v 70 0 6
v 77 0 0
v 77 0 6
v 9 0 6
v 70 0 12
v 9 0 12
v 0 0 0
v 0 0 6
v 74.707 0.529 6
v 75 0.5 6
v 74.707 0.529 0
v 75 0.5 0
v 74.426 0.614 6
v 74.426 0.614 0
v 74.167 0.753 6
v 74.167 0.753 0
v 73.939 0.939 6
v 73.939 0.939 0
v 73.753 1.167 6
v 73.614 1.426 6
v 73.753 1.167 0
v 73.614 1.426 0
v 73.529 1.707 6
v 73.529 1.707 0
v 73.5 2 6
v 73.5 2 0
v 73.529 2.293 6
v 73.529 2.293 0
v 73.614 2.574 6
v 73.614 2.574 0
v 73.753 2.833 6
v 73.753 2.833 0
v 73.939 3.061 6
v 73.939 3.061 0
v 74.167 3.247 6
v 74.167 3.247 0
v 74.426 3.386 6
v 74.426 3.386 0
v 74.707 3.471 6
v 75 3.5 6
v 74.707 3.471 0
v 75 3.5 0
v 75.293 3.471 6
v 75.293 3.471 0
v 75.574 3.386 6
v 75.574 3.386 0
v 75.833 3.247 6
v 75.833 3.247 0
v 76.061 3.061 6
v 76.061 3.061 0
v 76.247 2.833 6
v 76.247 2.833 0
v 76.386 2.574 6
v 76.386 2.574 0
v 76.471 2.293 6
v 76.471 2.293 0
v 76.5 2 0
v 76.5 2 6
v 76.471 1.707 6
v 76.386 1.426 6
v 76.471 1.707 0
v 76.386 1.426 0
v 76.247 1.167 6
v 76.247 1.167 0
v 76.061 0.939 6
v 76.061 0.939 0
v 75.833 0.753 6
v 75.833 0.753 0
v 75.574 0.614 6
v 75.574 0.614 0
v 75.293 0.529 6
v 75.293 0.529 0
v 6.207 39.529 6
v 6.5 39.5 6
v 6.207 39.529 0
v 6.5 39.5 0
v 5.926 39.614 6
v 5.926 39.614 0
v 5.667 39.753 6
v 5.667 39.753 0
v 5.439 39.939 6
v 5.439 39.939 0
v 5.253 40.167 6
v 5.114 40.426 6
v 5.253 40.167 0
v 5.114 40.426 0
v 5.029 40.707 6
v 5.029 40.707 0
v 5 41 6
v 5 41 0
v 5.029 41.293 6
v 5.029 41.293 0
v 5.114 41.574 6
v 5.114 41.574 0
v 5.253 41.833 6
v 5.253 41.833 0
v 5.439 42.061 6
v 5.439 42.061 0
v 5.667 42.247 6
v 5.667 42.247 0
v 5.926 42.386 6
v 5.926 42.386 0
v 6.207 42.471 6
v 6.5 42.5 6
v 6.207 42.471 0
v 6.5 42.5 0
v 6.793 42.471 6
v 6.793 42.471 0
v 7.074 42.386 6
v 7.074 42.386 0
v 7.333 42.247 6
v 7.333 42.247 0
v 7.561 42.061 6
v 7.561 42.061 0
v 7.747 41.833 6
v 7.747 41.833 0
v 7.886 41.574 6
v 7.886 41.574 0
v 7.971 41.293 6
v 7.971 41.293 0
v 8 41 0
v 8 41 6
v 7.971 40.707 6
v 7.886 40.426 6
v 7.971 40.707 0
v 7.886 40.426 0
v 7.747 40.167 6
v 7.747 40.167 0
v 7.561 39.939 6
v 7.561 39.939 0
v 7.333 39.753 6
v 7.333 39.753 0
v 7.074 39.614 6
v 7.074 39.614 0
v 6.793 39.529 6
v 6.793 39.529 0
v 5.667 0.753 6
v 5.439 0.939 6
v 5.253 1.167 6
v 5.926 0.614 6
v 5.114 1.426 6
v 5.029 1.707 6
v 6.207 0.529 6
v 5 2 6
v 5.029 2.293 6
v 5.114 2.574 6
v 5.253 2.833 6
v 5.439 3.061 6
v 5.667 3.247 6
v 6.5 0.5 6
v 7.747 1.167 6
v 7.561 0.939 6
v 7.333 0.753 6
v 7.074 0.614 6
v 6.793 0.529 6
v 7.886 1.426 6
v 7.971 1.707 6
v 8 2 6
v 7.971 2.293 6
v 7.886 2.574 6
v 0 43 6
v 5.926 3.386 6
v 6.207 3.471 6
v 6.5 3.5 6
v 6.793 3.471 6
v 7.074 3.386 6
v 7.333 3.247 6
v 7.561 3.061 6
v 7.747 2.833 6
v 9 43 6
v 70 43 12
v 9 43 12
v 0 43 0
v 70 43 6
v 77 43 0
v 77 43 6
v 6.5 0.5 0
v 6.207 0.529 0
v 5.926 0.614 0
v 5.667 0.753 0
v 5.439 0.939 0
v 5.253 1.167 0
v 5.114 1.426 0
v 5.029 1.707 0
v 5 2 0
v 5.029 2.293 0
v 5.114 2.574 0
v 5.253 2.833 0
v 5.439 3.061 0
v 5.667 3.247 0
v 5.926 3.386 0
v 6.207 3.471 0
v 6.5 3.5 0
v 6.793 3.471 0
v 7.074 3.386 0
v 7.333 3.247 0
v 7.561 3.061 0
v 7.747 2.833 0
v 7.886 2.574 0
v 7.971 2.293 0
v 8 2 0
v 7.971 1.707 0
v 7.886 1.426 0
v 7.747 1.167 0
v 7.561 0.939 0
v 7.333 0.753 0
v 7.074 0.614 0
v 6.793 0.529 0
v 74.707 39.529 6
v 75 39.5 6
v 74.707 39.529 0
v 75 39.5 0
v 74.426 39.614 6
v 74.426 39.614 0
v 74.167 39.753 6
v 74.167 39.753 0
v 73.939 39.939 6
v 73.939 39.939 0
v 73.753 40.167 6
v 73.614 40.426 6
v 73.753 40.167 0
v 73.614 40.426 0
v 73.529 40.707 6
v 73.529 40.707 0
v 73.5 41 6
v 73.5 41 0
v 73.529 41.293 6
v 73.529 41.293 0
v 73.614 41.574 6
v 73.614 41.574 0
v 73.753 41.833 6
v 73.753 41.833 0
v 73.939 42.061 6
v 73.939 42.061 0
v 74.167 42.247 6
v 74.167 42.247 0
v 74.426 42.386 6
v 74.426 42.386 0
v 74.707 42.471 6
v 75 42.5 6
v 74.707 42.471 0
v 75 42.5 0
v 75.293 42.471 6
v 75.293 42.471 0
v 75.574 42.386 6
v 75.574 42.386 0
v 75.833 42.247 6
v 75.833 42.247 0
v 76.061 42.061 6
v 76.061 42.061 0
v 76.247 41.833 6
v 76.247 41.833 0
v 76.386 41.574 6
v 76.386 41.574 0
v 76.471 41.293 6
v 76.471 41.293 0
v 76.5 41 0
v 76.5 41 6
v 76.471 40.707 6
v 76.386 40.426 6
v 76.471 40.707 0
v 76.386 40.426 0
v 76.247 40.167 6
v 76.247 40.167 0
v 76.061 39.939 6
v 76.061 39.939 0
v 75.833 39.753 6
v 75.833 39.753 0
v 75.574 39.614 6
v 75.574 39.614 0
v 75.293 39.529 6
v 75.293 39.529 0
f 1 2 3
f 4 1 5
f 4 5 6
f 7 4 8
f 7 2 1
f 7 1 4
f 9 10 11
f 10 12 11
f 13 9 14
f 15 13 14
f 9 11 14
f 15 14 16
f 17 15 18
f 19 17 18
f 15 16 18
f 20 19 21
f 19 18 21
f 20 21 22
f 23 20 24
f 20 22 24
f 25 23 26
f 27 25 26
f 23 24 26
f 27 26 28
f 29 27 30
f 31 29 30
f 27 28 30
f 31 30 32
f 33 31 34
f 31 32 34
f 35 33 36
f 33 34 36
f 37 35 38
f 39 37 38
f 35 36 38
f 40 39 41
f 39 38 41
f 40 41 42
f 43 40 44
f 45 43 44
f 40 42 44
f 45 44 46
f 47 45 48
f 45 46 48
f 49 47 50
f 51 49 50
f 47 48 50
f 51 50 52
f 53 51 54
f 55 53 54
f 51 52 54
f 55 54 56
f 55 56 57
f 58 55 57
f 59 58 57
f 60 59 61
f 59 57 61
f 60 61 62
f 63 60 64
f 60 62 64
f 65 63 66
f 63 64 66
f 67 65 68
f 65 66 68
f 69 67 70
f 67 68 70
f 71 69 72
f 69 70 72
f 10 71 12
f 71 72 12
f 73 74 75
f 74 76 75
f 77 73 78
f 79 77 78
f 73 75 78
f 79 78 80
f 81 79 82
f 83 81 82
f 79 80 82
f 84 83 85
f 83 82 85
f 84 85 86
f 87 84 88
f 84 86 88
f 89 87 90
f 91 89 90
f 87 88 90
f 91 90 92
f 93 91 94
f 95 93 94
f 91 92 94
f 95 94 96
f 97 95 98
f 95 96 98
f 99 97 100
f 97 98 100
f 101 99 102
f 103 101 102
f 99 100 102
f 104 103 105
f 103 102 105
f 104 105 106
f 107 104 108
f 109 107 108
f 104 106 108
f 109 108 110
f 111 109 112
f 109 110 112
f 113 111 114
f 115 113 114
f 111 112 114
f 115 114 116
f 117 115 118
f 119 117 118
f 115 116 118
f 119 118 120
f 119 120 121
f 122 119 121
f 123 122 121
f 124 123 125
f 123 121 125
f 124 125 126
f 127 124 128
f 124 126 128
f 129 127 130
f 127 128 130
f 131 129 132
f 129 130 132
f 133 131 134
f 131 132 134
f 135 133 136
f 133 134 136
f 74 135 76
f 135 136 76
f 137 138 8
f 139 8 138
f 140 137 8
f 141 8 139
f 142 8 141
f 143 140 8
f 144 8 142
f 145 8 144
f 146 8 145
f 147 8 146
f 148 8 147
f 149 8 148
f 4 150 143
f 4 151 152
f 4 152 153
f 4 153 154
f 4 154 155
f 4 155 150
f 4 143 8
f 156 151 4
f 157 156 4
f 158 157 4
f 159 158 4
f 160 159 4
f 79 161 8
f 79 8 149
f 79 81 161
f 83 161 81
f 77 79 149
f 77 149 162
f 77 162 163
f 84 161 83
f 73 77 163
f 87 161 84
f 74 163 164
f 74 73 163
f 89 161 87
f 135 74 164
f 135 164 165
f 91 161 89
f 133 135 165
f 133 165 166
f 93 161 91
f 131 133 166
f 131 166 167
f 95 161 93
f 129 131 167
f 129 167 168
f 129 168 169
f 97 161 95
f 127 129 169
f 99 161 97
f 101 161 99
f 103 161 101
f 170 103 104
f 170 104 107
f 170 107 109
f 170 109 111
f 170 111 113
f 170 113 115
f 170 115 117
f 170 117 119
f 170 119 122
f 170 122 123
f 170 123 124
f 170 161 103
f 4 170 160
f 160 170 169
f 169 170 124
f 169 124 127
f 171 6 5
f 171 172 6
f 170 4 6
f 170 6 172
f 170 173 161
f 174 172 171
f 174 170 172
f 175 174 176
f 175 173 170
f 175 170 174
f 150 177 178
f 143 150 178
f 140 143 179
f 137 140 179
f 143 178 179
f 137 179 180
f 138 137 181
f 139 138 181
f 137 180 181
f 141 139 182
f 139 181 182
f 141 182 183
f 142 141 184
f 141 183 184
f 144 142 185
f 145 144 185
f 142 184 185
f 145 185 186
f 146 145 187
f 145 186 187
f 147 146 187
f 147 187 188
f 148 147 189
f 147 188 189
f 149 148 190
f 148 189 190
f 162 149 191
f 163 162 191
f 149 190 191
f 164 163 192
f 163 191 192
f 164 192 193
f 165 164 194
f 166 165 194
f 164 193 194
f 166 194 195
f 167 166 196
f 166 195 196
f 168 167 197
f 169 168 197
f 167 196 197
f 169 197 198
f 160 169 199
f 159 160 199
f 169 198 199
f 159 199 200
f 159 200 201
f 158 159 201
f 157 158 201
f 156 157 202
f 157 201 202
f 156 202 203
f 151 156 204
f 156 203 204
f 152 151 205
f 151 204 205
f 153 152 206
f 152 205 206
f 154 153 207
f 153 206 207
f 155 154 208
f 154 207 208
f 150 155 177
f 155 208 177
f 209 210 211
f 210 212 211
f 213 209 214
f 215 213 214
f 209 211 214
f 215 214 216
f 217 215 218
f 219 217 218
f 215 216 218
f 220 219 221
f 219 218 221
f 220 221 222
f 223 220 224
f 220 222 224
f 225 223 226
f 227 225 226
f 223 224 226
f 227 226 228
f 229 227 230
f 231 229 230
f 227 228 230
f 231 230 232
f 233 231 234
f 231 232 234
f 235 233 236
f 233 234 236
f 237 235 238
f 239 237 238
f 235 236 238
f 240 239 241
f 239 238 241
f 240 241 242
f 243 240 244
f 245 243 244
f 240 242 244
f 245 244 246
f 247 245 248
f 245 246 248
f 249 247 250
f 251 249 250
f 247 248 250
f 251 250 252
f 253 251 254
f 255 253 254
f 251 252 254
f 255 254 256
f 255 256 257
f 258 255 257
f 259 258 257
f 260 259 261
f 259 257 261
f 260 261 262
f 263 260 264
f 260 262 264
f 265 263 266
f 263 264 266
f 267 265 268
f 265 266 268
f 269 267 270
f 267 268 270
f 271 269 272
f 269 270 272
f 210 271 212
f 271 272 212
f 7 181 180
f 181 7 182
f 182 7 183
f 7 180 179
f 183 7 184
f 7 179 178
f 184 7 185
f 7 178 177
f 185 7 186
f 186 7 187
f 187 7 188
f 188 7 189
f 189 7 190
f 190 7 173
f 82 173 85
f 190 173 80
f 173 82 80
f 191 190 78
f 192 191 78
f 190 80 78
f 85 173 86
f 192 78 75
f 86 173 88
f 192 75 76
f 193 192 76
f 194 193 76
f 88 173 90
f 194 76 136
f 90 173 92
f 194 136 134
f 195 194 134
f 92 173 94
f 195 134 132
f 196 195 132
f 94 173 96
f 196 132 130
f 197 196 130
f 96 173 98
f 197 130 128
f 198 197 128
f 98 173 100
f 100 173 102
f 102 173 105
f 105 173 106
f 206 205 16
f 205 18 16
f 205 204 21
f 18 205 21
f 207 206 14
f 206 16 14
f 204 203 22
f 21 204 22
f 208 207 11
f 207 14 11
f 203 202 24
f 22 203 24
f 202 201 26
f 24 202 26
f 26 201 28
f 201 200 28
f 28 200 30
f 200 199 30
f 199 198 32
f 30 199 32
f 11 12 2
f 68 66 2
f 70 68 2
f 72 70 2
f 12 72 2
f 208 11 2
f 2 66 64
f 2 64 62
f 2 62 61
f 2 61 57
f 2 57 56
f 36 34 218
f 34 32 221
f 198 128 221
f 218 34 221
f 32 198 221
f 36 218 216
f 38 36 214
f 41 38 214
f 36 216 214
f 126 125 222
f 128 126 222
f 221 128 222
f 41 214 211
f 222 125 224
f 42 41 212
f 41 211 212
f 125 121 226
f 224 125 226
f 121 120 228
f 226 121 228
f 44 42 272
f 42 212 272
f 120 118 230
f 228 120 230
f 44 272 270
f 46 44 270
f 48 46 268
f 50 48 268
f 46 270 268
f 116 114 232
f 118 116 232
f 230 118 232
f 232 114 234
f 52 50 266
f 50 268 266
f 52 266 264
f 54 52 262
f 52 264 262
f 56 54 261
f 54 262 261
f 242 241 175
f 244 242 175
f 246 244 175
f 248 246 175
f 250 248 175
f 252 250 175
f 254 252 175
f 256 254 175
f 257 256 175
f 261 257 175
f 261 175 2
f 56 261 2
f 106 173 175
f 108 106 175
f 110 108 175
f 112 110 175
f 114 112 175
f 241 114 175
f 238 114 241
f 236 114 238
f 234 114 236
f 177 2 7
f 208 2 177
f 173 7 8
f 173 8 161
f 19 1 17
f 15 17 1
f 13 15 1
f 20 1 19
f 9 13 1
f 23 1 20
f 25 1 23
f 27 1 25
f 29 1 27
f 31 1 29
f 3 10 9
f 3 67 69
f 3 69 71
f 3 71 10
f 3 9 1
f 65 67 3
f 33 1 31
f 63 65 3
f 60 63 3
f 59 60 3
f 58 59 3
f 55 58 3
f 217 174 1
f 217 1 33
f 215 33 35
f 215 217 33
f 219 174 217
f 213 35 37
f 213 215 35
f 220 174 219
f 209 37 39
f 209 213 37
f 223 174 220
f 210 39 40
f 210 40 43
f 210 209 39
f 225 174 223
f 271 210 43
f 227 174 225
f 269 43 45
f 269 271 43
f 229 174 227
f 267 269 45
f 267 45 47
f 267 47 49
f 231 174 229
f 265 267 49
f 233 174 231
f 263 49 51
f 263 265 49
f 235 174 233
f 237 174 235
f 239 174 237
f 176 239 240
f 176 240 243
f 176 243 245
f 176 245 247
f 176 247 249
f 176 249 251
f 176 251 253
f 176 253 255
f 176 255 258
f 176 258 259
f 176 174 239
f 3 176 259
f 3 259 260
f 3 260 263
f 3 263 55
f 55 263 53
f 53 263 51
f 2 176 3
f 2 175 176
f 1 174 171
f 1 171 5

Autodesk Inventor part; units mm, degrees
ref_plane "YZ Plane" through (0, 0, 0) normal (1, 0, 0) x (0, 1, 0)
ref_plane "XZ Plane" through (0, 0, 0) normal (0, 1, 0) x (-1, 0, 0)
ref_plane "XY Plane" through (0, 0, 0) normal (0, 0, 1) x (1, 0, 0)
sketch "Sketch1" plane through (0, 0, 0) normal (0, 0, 1) x (1, 0, 0)
  line L0 (0, 43) -> (77, 43)
  line L1 (77, 43) -> (77, 0)
  line L2 (77, 0) -> (0, 0)
  line L3 (0, 0) -> (0, 43)
  point P0 (74.8142, 2.33)
  point P1 (74.8142, 51.9717)
  dimension "d0" = 77
  dimension "d1" = 43
extrude "Extrusion1" add sketch "Sketch1" along normal blind 6
sketch "Sketch2" plane through (0, 0, 6) normal (0, 0, 1) x (1, 0, 0)
  point P0 (0, 0)
sketch "Sketch3" plane through (0, 0, 6) normal (0, 0, 1) x (1, 0, 0)
  line L0 (9, 43) -> (70, 43)
  line L1 (70, 43) -> (70, 0)
  line L2 (70, 0) -> (9, 0)
  line L3 (9, 0) -> (9, 43)
  line L4 (77, 0) -> (77, 43) projected
  line L5 (0, 0) -> (77, 0) projected
  line L6 (77, 43) -> (0, 43) projected
  point P0 (75, 41)
  point P1 (75, 2)
  dimension "d4" = 61
  dimension "d5" = 7
  dimension "d6" = 2
  dimension "d7" = 2
  dimension "d8" = 2
extrude "Extrusion2" add sketch "Sketch3" along normal blind 6 contours L0 L1 L2 L3
sketch "Sketch4" plane through (0, 0, 6) normal (0, 0, 1) x (1, 0, 0)
  line L0 (77, 43) -> (70, 43) projected
  line L1 (70, 0) -> (77, 0) projected
  line L2 (77, 0) -> (77, 43) projected
  point P0 (0, 0)
  point P1 (75, 2)
  point P2 (75, 41)
  dimension "d11" = 2
  dimension "d12" = 2
  dimension "d13" = 2
hole "Hole1" at (75, 2, 6) at (75, 41, 6) direction (0, 0, -1) diameter 3 end through all
sketch "Sketch5" plane through (0, 0, 6) normal (0, 0, 1) x (1, 0, 0)
  line L0 (9, 43) -> (0, 43) projected
  line L1 (0, 0) -> (9, 0) projected
  line L2 (0, 43) -> (0, 0) projected
  point P0 (6.5, 2)
  point P1 (6.5, 41)
  dimension "d21" = 2
  dimension "d22" = 2
  dimension "d23" = 6.5
hole "Hole2" at (6.5, 41, 6) at (6.5, 2, 6) direction (0, 0, -1) diameter 3 end through all
properties part number "Pantalla"
